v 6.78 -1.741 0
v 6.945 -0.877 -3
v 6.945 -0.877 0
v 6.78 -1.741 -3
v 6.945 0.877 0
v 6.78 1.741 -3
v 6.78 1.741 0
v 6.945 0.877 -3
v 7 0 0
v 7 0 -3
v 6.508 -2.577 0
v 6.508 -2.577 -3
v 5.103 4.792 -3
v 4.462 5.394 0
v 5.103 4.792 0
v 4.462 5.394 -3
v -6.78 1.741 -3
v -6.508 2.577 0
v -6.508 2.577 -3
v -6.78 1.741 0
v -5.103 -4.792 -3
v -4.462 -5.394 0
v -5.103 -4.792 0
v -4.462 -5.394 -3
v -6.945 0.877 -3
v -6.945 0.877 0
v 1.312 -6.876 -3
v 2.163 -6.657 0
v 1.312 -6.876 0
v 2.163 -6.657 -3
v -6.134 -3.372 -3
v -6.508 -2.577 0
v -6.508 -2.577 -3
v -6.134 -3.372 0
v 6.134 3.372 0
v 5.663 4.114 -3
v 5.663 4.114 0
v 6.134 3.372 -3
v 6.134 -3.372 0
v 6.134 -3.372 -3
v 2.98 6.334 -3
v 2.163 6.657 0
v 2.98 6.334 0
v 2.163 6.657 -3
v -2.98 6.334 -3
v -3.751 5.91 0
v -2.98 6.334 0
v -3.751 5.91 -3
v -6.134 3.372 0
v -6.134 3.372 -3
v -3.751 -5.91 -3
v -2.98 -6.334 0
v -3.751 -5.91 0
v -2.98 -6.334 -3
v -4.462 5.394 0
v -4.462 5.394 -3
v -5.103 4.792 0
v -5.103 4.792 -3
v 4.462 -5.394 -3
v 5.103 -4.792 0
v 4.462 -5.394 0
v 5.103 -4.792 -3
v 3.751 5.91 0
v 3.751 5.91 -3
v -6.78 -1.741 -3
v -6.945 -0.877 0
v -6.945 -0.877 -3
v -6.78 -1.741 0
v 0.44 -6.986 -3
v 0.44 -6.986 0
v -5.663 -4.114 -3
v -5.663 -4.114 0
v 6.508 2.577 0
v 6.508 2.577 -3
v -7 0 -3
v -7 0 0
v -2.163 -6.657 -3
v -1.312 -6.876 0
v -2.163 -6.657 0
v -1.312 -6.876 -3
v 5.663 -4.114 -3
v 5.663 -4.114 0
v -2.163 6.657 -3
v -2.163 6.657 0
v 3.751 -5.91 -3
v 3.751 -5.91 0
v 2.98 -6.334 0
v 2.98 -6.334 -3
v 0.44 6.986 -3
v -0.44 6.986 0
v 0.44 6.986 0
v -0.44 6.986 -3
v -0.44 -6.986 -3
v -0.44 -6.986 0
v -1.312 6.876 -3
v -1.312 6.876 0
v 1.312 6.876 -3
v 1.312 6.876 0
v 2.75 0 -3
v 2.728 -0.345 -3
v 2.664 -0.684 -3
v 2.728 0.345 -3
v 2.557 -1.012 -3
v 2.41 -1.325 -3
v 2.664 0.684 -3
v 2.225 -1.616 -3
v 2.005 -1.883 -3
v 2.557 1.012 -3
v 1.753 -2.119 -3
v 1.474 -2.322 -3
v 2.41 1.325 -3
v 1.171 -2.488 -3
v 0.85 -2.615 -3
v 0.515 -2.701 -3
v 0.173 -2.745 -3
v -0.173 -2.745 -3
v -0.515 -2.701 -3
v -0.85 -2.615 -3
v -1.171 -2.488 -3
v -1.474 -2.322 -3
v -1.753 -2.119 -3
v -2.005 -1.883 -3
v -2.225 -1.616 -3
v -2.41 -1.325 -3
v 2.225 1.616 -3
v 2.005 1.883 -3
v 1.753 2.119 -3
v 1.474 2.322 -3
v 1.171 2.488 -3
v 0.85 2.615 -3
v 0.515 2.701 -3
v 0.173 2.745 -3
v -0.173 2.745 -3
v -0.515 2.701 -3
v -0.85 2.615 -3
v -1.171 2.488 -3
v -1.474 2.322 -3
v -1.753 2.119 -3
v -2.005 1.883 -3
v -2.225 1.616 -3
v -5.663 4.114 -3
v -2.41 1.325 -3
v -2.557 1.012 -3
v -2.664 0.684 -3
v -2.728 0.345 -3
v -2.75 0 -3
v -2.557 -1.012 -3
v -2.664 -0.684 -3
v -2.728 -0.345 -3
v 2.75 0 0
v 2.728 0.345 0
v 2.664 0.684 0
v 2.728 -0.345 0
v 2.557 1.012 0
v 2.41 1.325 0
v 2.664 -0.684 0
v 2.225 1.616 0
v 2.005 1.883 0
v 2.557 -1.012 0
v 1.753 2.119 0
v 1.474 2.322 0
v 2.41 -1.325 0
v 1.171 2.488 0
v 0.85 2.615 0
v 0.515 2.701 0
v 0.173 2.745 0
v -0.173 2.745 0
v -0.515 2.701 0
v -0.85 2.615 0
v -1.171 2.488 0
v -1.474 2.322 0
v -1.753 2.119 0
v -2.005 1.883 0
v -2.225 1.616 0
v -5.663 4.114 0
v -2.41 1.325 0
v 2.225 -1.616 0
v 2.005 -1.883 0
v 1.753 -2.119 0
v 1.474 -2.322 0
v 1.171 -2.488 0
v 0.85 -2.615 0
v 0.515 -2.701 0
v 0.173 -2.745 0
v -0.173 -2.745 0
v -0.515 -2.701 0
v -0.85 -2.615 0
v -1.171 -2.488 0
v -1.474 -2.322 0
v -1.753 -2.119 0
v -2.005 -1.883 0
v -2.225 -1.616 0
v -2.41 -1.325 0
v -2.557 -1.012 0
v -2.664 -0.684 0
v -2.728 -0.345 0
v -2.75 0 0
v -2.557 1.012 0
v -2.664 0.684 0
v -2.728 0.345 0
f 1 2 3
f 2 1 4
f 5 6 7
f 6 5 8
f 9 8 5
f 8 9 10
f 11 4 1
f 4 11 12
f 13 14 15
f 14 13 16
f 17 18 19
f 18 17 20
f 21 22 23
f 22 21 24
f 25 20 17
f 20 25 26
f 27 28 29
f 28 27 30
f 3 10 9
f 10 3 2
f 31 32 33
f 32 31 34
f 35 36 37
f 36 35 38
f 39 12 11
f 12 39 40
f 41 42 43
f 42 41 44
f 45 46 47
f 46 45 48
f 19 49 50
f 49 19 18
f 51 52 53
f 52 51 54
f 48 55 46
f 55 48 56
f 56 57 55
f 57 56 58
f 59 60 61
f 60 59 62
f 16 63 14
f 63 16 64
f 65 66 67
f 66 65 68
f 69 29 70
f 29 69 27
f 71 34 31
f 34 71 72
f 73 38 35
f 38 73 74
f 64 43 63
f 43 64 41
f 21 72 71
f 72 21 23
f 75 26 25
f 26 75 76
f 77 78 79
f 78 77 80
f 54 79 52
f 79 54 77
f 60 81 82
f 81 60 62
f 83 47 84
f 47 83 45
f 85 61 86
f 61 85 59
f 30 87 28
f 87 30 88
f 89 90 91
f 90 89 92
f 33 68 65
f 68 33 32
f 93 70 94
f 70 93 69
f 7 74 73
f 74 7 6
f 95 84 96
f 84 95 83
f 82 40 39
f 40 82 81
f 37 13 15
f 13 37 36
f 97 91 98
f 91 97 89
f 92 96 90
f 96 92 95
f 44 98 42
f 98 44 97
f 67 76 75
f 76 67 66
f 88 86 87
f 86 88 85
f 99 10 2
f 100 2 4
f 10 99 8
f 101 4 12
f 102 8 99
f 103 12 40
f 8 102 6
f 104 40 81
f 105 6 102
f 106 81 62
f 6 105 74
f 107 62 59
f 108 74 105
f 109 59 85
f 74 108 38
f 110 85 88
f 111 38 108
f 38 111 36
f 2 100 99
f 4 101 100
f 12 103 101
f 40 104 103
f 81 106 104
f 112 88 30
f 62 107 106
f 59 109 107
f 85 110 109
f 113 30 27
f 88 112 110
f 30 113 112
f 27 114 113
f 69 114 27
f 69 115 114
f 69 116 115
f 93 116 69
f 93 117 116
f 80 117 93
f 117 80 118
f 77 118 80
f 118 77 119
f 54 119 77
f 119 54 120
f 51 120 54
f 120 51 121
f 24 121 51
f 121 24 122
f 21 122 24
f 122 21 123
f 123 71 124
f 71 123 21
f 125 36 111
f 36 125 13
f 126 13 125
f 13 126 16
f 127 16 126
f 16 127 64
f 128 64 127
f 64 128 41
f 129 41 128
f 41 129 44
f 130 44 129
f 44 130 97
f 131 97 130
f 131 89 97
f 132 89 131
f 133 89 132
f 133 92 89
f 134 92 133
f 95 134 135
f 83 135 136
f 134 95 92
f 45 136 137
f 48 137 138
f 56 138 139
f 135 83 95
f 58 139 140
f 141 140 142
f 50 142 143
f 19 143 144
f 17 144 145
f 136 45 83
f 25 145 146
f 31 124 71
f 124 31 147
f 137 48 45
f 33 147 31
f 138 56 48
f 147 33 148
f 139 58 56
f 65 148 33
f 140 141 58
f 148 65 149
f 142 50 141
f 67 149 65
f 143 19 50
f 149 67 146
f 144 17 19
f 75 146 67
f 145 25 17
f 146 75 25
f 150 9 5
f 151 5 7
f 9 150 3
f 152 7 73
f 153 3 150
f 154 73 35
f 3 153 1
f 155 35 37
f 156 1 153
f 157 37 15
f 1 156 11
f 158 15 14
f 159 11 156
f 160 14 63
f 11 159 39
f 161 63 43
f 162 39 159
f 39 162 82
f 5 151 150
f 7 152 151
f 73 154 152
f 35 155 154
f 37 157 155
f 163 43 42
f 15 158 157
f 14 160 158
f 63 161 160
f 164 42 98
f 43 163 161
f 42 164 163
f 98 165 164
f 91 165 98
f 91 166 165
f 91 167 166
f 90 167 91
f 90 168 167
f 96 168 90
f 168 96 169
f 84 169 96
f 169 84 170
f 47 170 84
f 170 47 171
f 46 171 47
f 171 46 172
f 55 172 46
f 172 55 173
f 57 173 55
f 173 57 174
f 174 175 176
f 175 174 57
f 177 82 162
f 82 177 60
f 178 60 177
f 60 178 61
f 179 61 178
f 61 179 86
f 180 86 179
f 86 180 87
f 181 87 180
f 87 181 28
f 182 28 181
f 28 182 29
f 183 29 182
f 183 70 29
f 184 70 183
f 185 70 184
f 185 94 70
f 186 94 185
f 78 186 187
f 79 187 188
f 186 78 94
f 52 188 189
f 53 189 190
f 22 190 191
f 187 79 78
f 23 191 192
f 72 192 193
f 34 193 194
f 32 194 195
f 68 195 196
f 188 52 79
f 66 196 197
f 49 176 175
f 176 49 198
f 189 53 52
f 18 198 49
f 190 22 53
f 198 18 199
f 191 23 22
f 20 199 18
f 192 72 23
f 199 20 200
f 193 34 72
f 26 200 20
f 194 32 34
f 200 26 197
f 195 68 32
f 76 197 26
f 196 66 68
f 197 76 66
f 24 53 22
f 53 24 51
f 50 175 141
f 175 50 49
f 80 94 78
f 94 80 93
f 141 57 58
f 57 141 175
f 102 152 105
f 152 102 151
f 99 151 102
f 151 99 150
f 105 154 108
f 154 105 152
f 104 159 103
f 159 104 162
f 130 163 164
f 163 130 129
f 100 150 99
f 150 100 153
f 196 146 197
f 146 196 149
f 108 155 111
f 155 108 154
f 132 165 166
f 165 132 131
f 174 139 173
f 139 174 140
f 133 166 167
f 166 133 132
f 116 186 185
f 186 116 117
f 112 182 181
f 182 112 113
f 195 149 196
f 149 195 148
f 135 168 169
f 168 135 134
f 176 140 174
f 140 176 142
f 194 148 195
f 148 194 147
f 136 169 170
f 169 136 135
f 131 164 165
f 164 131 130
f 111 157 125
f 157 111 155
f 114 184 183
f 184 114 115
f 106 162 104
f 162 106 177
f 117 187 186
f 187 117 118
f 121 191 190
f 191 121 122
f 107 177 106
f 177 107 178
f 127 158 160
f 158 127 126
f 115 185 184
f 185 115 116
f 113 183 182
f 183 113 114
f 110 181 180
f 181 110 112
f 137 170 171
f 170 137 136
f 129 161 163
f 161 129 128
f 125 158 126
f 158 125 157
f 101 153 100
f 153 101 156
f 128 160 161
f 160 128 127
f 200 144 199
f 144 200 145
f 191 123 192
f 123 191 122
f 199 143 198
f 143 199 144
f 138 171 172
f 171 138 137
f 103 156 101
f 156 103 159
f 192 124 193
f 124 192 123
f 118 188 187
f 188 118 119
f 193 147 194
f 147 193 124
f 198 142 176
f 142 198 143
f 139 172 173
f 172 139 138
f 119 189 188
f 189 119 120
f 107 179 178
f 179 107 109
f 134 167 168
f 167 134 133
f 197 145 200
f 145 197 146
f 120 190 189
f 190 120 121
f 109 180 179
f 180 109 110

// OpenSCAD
$fn = 50;


difference() {
	union() {
		translate(v = [0, 0, -3.0000000000]) {
			cylinder(h = 3, r = 7.0000000000);
		}
		cylinder(h = 0, r = 13.0000000000);
	}
	union() {
		#translate(v = [0, 0, -3]) {
			cylinder(h = 3, r = 2.7500000000);
		}
	}
}
